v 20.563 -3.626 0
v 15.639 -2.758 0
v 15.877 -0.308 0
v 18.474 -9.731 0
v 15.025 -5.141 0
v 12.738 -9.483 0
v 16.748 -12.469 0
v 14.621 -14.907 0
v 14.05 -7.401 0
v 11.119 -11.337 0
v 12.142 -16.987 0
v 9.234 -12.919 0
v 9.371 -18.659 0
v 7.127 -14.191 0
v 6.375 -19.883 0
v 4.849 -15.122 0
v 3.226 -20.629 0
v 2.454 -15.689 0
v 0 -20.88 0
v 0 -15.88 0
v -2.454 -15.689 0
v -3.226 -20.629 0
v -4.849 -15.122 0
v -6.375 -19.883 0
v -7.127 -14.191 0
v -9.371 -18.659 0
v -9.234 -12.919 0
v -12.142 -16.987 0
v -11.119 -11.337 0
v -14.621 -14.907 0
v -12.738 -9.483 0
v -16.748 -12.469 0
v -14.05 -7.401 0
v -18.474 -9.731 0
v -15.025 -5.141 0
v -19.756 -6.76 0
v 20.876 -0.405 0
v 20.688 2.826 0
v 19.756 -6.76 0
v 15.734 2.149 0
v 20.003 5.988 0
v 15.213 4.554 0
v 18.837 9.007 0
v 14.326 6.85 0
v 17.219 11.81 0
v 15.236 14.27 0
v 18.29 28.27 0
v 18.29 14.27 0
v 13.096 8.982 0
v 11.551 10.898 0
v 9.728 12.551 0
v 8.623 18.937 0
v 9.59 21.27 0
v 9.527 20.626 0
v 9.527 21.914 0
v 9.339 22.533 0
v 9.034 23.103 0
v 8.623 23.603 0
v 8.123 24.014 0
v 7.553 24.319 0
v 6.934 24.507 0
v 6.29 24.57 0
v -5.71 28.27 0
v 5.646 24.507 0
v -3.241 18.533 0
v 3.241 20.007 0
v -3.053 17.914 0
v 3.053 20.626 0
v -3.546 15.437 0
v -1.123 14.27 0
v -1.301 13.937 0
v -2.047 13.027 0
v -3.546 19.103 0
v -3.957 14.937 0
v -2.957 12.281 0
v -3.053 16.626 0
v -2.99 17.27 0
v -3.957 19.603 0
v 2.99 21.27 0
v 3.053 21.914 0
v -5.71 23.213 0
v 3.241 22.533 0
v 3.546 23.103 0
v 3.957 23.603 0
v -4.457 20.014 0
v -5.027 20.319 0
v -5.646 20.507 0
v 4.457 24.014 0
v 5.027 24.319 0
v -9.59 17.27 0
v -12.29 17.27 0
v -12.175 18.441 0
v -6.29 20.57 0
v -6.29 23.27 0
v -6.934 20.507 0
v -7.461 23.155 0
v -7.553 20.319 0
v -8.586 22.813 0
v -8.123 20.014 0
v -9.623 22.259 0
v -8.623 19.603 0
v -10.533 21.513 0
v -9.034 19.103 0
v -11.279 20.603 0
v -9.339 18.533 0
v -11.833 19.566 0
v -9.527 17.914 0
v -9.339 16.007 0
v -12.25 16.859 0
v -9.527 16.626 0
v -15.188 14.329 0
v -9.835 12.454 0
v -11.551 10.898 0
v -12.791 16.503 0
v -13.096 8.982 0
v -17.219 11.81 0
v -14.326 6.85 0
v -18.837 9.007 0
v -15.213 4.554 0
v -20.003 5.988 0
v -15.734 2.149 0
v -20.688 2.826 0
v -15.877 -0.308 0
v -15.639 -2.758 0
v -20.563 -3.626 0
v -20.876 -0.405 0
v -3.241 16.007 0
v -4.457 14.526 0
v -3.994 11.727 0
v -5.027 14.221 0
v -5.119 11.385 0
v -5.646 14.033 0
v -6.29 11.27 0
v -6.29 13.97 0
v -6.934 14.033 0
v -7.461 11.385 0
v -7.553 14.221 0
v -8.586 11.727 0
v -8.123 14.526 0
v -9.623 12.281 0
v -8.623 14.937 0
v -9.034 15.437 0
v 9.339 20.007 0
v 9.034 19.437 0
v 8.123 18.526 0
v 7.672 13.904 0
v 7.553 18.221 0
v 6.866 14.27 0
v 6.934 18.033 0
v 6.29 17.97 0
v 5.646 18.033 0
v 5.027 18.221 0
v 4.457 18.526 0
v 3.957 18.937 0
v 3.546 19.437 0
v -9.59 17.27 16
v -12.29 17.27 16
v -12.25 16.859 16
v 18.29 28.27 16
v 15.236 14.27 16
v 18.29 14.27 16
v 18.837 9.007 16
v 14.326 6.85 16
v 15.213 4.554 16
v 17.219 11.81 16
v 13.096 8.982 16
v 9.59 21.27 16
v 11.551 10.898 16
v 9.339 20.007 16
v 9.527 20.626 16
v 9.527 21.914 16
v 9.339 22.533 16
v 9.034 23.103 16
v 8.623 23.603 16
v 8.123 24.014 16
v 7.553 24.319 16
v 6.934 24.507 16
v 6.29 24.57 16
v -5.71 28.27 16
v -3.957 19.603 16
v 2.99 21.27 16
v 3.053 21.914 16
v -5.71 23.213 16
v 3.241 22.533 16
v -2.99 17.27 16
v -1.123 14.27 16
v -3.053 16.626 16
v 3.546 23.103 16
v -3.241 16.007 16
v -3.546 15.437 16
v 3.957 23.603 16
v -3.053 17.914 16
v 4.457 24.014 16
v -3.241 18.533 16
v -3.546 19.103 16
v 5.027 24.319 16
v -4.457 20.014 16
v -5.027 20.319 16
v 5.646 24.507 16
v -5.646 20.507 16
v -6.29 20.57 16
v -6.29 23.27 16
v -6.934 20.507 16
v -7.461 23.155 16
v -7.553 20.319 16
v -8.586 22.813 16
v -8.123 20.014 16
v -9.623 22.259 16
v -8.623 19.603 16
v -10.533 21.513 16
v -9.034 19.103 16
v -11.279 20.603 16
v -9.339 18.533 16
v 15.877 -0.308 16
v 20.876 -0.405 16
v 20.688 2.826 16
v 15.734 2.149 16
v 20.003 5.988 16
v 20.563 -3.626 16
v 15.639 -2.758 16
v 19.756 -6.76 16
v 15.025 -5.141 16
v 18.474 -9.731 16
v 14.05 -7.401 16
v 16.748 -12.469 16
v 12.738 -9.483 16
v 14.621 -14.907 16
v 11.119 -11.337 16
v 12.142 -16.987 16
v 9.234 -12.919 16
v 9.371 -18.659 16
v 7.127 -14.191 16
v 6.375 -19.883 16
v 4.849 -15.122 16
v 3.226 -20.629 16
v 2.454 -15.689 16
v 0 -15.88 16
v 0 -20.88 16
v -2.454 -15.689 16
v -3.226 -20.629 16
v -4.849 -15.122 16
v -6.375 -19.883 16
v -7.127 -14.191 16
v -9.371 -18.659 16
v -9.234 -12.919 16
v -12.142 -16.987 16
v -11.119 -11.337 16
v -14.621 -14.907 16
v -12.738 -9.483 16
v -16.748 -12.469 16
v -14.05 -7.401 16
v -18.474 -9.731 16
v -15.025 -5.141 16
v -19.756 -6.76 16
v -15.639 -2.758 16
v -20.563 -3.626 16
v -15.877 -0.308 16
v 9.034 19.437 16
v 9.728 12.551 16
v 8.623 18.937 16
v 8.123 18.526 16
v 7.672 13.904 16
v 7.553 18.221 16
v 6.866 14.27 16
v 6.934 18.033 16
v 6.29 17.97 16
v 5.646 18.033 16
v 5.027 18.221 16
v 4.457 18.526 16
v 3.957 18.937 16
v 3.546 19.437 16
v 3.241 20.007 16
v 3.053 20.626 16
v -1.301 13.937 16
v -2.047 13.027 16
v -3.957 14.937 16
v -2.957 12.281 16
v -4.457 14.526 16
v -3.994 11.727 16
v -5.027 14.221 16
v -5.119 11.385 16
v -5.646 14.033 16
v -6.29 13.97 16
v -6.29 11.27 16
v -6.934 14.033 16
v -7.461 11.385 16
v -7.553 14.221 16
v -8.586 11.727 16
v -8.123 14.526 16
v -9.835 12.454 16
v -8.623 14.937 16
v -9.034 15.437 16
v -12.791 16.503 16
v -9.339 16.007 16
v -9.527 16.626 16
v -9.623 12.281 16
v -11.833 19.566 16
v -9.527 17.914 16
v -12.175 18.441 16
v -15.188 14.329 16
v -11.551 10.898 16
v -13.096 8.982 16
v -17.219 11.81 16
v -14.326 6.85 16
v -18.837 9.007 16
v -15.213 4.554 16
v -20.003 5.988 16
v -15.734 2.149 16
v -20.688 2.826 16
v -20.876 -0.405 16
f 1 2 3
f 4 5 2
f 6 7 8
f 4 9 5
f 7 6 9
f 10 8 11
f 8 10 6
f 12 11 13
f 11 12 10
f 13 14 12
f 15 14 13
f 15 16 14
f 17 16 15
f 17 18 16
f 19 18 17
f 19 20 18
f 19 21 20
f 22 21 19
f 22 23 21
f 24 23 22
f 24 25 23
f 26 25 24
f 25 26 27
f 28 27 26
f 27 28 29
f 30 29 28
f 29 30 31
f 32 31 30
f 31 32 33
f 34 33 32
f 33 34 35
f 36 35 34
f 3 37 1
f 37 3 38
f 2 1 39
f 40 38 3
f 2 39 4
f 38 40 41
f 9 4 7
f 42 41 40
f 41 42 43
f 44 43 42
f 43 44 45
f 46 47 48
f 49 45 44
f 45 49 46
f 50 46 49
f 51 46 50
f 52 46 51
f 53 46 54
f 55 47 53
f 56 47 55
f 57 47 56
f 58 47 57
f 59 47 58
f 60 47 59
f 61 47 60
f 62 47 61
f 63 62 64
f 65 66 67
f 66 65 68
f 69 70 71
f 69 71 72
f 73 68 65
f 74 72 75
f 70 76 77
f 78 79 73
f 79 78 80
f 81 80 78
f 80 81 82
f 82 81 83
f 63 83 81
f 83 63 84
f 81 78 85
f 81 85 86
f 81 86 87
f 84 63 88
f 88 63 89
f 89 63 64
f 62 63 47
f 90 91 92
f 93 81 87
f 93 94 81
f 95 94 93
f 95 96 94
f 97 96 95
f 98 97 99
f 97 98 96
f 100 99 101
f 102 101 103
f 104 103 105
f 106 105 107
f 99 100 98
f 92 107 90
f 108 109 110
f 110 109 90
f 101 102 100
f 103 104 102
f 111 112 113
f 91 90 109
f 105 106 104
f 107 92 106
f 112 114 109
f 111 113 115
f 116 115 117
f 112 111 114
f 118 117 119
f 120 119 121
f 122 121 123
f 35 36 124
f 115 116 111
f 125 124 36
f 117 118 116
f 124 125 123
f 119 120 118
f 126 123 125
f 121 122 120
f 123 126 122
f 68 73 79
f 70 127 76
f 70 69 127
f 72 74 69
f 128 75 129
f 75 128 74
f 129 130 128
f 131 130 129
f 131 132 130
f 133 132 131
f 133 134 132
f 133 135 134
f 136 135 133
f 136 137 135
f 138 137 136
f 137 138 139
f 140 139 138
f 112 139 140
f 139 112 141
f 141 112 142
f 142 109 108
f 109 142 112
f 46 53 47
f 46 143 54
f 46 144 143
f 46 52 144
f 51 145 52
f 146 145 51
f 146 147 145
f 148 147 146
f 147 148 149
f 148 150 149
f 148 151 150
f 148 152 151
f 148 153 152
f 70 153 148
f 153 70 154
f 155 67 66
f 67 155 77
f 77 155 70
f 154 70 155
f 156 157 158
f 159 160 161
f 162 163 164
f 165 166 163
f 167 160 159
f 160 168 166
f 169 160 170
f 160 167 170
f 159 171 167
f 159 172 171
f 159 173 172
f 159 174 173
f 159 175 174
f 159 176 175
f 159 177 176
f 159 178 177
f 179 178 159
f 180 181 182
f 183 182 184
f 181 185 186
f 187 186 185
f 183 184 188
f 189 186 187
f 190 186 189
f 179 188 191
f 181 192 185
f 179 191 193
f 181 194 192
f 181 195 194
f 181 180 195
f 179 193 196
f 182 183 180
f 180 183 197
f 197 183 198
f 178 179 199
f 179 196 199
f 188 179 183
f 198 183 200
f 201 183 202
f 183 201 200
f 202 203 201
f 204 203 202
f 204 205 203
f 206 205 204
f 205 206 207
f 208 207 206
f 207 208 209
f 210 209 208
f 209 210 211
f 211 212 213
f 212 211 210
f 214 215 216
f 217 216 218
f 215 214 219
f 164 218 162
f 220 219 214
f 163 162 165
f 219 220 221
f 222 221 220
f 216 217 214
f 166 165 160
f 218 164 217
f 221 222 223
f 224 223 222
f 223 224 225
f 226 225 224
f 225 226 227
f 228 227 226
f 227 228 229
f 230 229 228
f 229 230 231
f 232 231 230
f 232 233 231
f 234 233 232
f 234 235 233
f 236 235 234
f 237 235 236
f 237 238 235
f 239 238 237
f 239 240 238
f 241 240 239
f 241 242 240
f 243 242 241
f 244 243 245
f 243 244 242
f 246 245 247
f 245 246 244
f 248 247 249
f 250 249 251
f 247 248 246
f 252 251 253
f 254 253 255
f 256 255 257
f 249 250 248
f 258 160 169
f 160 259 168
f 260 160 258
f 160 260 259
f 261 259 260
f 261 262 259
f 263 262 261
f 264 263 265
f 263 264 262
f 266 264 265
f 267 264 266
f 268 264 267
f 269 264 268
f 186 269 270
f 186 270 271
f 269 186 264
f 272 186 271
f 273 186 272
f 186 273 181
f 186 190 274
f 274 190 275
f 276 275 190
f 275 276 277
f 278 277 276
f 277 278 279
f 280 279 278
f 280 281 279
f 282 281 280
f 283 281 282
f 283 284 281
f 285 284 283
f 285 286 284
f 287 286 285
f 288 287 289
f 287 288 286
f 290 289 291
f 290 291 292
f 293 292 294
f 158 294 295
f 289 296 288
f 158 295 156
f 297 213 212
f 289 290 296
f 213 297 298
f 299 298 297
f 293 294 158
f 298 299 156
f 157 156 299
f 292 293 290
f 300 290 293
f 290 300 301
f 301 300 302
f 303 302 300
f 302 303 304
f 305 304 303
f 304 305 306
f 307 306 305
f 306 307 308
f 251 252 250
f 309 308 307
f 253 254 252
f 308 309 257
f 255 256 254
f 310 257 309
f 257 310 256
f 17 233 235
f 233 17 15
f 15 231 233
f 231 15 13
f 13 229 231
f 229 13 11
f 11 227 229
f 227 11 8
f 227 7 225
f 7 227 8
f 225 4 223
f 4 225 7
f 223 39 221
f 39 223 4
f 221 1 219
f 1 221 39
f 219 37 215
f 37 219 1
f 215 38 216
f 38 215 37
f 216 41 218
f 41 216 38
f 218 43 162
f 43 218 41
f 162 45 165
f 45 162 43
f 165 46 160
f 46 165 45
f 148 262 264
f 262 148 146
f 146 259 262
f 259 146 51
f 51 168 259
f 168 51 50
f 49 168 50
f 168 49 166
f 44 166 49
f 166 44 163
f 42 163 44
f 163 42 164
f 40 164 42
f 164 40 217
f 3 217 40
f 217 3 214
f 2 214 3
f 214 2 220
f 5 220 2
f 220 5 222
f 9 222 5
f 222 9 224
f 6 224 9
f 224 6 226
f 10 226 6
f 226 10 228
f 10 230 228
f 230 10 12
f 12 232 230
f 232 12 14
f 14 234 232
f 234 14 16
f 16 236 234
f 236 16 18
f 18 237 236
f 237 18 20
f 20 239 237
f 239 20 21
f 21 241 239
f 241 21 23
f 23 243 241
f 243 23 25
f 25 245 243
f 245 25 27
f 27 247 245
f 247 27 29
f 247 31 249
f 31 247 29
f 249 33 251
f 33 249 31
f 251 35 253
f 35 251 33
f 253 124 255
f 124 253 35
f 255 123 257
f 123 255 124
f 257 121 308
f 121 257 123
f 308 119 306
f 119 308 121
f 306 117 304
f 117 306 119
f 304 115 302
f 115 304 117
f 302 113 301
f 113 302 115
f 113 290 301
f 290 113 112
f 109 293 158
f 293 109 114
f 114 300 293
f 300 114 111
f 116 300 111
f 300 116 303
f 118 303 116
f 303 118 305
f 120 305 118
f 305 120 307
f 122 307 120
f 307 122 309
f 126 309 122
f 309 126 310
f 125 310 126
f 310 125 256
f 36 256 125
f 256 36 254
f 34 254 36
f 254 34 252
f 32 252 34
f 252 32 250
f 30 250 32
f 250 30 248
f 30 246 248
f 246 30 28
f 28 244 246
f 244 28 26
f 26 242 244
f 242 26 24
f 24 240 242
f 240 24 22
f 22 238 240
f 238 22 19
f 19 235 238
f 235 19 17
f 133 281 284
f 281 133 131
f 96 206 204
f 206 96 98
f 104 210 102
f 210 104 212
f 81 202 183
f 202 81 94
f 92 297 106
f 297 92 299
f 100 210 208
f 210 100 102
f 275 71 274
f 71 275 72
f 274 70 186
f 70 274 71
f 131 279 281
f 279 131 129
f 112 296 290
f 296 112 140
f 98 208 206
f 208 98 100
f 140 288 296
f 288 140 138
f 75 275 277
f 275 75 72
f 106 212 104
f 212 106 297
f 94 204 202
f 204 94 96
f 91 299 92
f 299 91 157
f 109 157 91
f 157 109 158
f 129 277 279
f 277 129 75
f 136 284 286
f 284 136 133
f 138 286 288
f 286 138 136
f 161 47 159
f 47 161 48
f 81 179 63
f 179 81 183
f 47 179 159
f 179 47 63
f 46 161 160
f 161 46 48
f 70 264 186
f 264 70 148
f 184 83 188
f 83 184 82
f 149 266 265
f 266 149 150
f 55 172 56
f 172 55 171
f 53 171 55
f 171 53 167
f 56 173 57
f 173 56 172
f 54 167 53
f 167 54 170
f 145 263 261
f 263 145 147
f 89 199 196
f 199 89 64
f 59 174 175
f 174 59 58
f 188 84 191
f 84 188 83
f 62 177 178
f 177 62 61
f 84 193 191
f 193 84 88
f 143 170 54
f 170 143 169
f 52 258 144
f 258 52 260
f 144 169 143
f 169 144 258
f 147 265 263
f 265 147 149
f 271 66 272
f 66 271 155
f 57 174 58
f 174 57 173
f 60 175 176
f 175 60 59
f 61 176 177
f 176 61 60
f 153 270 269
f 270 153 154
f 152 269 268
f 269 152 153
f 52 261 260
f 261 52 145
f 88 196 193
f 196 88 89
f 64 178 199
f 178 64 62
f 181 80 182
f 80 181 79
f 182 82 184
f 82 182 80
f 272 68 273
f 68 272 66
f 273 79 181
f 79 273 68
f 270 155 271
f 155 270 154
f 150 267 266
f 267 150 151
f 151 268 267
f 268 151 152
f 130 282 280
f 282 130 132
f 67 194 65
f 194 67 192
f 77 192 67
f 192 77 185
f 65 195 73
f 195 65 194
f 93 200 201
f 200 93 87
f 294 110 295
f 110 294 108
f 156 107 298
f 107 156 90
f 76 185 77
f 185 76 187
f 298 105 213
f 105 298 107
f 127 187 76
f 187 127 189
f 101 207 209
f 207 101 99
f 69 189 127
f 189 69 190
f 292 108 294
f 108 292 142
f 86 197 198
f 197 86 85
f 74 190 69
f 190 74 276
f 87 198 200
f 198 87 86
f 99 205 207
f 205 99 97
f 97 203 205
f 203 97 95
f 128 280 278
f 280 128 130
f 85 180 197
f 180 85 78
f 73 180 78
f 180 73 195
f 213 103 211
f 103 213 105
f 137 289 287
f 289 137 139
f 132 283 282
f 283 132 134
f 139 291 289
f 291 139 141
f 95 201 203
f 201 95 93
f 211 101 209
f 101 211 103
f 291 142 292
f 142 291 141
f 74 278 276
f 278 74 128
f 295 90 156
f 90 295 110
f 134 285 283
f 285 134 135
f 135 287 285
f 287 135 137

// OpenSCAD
$fn = 32;

// ----------------------------------------------------------------------
// Pipe clamp: 41.76 mm ring, 5 mm wall, 16 mm wide
// ----------------------------------------------------------------------

// --- parameters (mm) ---
outer_r = 20.88;          // clamp outside radius
inner_r = 15.88;          // pipe bore radius
band = 5;                 // band thickness
clamp_w = 16;             // clamp width
opening = 40;             // opening angle between the ends
lug_w = 24;               // lug width
lug_len = 14;             // lug length
bolt_d = 6.6;             // bolt hole
knuckle_d = 12;           // hinge knuckle diameter
pin_d = 6.6;              // hinge pin hole

clamp_profile = [[-7.141, 19.621], [-10.087, 18.282], [-12.791, 16.503], [-15.188, 14.329], [-17.219, 11.81], [-18.837, 9.007], [-20.003, 5.988], [-20.688, 2.826], [-20.876, -0.405], [-20.563, -3.626], [-19.756, -6.76], [-18.474, -9.731], [-16.748, -12.469], [-14.621, -14.907], [-12.142, -16.987], [-9.371, -18.659], [-6.375, -19.883], [-3.226, -20.629], [0, -20.88], [3.226, -20.629], [6.375, -19.883], [9.371, -18.659], [12.142, -16.987], [14.621, -14.907], [16.748, -12.469], [18.474, -9.731], [19.756, -6.76], [20.563, -3.626], [20.876, -0.405], [20.688, 2.826], [20.003, 5.988], [18.837, 9.007], [17.219, 11.81], [15.188, 14.329], [12.791, 16.503], [10.087, 18.282], [7.141, 19.621], [5.431, 14.922], [7.672, 13.904], [9.728, 12.551], [11.551, 10.898], [13.096, 8.982], [14.326, 6.85], [15.213, 4.554], [15.734, 2.149], [15.877, -0.308], [15.639, -2.758], [15.025, -5.141], [14.05, -7.401], [12.738, -9.483], [11.119, -11.337], [9.234, -12.919], [7.127, -14.191], [4.849, -15.122], [2.454, -15.689], [0, -15.88], [-2.454, -15.689], [-4.849, -15.122], [-7.127, -14.191], [-9.234, -12.919], [-11.119, -11.337], [-12.738, -9.483], [-14.05, -7.401], [-15.025, -5.141], [-15.639, -2.758], [-15.877, -0.308], [-15.734, 2.149], [-15.213, 4.554], [-14.326, 6.85], [-13.096, 8.982], [-11.551, 10.898], [-9.728, 12.551], [-7.672, 13.904], [-5.431, 14.922]];

difference() {
  union() {
    linear_extrude(height = clamp_w) polygon(clamp_profile);
    /* hinge knuckle, sunk 2 mm into the band end */
    translate([-6.29, 17.27, 0]) cylinder(h = clamp_w, d = knuckle_d);
    /* bolt lug on the other end */
    translate([-5.71, 14.27, 0]) cube([lug_w, 14, clamp_w]);
  }
  translate([6.29, 21.27, -2.5]) cylinder(h = clamp_w + 5, d = bolt_d);
  translate([-6.29, 17.27, -2.5]) cylinder(h = clamp_w + 5, d = pin_d);
}
